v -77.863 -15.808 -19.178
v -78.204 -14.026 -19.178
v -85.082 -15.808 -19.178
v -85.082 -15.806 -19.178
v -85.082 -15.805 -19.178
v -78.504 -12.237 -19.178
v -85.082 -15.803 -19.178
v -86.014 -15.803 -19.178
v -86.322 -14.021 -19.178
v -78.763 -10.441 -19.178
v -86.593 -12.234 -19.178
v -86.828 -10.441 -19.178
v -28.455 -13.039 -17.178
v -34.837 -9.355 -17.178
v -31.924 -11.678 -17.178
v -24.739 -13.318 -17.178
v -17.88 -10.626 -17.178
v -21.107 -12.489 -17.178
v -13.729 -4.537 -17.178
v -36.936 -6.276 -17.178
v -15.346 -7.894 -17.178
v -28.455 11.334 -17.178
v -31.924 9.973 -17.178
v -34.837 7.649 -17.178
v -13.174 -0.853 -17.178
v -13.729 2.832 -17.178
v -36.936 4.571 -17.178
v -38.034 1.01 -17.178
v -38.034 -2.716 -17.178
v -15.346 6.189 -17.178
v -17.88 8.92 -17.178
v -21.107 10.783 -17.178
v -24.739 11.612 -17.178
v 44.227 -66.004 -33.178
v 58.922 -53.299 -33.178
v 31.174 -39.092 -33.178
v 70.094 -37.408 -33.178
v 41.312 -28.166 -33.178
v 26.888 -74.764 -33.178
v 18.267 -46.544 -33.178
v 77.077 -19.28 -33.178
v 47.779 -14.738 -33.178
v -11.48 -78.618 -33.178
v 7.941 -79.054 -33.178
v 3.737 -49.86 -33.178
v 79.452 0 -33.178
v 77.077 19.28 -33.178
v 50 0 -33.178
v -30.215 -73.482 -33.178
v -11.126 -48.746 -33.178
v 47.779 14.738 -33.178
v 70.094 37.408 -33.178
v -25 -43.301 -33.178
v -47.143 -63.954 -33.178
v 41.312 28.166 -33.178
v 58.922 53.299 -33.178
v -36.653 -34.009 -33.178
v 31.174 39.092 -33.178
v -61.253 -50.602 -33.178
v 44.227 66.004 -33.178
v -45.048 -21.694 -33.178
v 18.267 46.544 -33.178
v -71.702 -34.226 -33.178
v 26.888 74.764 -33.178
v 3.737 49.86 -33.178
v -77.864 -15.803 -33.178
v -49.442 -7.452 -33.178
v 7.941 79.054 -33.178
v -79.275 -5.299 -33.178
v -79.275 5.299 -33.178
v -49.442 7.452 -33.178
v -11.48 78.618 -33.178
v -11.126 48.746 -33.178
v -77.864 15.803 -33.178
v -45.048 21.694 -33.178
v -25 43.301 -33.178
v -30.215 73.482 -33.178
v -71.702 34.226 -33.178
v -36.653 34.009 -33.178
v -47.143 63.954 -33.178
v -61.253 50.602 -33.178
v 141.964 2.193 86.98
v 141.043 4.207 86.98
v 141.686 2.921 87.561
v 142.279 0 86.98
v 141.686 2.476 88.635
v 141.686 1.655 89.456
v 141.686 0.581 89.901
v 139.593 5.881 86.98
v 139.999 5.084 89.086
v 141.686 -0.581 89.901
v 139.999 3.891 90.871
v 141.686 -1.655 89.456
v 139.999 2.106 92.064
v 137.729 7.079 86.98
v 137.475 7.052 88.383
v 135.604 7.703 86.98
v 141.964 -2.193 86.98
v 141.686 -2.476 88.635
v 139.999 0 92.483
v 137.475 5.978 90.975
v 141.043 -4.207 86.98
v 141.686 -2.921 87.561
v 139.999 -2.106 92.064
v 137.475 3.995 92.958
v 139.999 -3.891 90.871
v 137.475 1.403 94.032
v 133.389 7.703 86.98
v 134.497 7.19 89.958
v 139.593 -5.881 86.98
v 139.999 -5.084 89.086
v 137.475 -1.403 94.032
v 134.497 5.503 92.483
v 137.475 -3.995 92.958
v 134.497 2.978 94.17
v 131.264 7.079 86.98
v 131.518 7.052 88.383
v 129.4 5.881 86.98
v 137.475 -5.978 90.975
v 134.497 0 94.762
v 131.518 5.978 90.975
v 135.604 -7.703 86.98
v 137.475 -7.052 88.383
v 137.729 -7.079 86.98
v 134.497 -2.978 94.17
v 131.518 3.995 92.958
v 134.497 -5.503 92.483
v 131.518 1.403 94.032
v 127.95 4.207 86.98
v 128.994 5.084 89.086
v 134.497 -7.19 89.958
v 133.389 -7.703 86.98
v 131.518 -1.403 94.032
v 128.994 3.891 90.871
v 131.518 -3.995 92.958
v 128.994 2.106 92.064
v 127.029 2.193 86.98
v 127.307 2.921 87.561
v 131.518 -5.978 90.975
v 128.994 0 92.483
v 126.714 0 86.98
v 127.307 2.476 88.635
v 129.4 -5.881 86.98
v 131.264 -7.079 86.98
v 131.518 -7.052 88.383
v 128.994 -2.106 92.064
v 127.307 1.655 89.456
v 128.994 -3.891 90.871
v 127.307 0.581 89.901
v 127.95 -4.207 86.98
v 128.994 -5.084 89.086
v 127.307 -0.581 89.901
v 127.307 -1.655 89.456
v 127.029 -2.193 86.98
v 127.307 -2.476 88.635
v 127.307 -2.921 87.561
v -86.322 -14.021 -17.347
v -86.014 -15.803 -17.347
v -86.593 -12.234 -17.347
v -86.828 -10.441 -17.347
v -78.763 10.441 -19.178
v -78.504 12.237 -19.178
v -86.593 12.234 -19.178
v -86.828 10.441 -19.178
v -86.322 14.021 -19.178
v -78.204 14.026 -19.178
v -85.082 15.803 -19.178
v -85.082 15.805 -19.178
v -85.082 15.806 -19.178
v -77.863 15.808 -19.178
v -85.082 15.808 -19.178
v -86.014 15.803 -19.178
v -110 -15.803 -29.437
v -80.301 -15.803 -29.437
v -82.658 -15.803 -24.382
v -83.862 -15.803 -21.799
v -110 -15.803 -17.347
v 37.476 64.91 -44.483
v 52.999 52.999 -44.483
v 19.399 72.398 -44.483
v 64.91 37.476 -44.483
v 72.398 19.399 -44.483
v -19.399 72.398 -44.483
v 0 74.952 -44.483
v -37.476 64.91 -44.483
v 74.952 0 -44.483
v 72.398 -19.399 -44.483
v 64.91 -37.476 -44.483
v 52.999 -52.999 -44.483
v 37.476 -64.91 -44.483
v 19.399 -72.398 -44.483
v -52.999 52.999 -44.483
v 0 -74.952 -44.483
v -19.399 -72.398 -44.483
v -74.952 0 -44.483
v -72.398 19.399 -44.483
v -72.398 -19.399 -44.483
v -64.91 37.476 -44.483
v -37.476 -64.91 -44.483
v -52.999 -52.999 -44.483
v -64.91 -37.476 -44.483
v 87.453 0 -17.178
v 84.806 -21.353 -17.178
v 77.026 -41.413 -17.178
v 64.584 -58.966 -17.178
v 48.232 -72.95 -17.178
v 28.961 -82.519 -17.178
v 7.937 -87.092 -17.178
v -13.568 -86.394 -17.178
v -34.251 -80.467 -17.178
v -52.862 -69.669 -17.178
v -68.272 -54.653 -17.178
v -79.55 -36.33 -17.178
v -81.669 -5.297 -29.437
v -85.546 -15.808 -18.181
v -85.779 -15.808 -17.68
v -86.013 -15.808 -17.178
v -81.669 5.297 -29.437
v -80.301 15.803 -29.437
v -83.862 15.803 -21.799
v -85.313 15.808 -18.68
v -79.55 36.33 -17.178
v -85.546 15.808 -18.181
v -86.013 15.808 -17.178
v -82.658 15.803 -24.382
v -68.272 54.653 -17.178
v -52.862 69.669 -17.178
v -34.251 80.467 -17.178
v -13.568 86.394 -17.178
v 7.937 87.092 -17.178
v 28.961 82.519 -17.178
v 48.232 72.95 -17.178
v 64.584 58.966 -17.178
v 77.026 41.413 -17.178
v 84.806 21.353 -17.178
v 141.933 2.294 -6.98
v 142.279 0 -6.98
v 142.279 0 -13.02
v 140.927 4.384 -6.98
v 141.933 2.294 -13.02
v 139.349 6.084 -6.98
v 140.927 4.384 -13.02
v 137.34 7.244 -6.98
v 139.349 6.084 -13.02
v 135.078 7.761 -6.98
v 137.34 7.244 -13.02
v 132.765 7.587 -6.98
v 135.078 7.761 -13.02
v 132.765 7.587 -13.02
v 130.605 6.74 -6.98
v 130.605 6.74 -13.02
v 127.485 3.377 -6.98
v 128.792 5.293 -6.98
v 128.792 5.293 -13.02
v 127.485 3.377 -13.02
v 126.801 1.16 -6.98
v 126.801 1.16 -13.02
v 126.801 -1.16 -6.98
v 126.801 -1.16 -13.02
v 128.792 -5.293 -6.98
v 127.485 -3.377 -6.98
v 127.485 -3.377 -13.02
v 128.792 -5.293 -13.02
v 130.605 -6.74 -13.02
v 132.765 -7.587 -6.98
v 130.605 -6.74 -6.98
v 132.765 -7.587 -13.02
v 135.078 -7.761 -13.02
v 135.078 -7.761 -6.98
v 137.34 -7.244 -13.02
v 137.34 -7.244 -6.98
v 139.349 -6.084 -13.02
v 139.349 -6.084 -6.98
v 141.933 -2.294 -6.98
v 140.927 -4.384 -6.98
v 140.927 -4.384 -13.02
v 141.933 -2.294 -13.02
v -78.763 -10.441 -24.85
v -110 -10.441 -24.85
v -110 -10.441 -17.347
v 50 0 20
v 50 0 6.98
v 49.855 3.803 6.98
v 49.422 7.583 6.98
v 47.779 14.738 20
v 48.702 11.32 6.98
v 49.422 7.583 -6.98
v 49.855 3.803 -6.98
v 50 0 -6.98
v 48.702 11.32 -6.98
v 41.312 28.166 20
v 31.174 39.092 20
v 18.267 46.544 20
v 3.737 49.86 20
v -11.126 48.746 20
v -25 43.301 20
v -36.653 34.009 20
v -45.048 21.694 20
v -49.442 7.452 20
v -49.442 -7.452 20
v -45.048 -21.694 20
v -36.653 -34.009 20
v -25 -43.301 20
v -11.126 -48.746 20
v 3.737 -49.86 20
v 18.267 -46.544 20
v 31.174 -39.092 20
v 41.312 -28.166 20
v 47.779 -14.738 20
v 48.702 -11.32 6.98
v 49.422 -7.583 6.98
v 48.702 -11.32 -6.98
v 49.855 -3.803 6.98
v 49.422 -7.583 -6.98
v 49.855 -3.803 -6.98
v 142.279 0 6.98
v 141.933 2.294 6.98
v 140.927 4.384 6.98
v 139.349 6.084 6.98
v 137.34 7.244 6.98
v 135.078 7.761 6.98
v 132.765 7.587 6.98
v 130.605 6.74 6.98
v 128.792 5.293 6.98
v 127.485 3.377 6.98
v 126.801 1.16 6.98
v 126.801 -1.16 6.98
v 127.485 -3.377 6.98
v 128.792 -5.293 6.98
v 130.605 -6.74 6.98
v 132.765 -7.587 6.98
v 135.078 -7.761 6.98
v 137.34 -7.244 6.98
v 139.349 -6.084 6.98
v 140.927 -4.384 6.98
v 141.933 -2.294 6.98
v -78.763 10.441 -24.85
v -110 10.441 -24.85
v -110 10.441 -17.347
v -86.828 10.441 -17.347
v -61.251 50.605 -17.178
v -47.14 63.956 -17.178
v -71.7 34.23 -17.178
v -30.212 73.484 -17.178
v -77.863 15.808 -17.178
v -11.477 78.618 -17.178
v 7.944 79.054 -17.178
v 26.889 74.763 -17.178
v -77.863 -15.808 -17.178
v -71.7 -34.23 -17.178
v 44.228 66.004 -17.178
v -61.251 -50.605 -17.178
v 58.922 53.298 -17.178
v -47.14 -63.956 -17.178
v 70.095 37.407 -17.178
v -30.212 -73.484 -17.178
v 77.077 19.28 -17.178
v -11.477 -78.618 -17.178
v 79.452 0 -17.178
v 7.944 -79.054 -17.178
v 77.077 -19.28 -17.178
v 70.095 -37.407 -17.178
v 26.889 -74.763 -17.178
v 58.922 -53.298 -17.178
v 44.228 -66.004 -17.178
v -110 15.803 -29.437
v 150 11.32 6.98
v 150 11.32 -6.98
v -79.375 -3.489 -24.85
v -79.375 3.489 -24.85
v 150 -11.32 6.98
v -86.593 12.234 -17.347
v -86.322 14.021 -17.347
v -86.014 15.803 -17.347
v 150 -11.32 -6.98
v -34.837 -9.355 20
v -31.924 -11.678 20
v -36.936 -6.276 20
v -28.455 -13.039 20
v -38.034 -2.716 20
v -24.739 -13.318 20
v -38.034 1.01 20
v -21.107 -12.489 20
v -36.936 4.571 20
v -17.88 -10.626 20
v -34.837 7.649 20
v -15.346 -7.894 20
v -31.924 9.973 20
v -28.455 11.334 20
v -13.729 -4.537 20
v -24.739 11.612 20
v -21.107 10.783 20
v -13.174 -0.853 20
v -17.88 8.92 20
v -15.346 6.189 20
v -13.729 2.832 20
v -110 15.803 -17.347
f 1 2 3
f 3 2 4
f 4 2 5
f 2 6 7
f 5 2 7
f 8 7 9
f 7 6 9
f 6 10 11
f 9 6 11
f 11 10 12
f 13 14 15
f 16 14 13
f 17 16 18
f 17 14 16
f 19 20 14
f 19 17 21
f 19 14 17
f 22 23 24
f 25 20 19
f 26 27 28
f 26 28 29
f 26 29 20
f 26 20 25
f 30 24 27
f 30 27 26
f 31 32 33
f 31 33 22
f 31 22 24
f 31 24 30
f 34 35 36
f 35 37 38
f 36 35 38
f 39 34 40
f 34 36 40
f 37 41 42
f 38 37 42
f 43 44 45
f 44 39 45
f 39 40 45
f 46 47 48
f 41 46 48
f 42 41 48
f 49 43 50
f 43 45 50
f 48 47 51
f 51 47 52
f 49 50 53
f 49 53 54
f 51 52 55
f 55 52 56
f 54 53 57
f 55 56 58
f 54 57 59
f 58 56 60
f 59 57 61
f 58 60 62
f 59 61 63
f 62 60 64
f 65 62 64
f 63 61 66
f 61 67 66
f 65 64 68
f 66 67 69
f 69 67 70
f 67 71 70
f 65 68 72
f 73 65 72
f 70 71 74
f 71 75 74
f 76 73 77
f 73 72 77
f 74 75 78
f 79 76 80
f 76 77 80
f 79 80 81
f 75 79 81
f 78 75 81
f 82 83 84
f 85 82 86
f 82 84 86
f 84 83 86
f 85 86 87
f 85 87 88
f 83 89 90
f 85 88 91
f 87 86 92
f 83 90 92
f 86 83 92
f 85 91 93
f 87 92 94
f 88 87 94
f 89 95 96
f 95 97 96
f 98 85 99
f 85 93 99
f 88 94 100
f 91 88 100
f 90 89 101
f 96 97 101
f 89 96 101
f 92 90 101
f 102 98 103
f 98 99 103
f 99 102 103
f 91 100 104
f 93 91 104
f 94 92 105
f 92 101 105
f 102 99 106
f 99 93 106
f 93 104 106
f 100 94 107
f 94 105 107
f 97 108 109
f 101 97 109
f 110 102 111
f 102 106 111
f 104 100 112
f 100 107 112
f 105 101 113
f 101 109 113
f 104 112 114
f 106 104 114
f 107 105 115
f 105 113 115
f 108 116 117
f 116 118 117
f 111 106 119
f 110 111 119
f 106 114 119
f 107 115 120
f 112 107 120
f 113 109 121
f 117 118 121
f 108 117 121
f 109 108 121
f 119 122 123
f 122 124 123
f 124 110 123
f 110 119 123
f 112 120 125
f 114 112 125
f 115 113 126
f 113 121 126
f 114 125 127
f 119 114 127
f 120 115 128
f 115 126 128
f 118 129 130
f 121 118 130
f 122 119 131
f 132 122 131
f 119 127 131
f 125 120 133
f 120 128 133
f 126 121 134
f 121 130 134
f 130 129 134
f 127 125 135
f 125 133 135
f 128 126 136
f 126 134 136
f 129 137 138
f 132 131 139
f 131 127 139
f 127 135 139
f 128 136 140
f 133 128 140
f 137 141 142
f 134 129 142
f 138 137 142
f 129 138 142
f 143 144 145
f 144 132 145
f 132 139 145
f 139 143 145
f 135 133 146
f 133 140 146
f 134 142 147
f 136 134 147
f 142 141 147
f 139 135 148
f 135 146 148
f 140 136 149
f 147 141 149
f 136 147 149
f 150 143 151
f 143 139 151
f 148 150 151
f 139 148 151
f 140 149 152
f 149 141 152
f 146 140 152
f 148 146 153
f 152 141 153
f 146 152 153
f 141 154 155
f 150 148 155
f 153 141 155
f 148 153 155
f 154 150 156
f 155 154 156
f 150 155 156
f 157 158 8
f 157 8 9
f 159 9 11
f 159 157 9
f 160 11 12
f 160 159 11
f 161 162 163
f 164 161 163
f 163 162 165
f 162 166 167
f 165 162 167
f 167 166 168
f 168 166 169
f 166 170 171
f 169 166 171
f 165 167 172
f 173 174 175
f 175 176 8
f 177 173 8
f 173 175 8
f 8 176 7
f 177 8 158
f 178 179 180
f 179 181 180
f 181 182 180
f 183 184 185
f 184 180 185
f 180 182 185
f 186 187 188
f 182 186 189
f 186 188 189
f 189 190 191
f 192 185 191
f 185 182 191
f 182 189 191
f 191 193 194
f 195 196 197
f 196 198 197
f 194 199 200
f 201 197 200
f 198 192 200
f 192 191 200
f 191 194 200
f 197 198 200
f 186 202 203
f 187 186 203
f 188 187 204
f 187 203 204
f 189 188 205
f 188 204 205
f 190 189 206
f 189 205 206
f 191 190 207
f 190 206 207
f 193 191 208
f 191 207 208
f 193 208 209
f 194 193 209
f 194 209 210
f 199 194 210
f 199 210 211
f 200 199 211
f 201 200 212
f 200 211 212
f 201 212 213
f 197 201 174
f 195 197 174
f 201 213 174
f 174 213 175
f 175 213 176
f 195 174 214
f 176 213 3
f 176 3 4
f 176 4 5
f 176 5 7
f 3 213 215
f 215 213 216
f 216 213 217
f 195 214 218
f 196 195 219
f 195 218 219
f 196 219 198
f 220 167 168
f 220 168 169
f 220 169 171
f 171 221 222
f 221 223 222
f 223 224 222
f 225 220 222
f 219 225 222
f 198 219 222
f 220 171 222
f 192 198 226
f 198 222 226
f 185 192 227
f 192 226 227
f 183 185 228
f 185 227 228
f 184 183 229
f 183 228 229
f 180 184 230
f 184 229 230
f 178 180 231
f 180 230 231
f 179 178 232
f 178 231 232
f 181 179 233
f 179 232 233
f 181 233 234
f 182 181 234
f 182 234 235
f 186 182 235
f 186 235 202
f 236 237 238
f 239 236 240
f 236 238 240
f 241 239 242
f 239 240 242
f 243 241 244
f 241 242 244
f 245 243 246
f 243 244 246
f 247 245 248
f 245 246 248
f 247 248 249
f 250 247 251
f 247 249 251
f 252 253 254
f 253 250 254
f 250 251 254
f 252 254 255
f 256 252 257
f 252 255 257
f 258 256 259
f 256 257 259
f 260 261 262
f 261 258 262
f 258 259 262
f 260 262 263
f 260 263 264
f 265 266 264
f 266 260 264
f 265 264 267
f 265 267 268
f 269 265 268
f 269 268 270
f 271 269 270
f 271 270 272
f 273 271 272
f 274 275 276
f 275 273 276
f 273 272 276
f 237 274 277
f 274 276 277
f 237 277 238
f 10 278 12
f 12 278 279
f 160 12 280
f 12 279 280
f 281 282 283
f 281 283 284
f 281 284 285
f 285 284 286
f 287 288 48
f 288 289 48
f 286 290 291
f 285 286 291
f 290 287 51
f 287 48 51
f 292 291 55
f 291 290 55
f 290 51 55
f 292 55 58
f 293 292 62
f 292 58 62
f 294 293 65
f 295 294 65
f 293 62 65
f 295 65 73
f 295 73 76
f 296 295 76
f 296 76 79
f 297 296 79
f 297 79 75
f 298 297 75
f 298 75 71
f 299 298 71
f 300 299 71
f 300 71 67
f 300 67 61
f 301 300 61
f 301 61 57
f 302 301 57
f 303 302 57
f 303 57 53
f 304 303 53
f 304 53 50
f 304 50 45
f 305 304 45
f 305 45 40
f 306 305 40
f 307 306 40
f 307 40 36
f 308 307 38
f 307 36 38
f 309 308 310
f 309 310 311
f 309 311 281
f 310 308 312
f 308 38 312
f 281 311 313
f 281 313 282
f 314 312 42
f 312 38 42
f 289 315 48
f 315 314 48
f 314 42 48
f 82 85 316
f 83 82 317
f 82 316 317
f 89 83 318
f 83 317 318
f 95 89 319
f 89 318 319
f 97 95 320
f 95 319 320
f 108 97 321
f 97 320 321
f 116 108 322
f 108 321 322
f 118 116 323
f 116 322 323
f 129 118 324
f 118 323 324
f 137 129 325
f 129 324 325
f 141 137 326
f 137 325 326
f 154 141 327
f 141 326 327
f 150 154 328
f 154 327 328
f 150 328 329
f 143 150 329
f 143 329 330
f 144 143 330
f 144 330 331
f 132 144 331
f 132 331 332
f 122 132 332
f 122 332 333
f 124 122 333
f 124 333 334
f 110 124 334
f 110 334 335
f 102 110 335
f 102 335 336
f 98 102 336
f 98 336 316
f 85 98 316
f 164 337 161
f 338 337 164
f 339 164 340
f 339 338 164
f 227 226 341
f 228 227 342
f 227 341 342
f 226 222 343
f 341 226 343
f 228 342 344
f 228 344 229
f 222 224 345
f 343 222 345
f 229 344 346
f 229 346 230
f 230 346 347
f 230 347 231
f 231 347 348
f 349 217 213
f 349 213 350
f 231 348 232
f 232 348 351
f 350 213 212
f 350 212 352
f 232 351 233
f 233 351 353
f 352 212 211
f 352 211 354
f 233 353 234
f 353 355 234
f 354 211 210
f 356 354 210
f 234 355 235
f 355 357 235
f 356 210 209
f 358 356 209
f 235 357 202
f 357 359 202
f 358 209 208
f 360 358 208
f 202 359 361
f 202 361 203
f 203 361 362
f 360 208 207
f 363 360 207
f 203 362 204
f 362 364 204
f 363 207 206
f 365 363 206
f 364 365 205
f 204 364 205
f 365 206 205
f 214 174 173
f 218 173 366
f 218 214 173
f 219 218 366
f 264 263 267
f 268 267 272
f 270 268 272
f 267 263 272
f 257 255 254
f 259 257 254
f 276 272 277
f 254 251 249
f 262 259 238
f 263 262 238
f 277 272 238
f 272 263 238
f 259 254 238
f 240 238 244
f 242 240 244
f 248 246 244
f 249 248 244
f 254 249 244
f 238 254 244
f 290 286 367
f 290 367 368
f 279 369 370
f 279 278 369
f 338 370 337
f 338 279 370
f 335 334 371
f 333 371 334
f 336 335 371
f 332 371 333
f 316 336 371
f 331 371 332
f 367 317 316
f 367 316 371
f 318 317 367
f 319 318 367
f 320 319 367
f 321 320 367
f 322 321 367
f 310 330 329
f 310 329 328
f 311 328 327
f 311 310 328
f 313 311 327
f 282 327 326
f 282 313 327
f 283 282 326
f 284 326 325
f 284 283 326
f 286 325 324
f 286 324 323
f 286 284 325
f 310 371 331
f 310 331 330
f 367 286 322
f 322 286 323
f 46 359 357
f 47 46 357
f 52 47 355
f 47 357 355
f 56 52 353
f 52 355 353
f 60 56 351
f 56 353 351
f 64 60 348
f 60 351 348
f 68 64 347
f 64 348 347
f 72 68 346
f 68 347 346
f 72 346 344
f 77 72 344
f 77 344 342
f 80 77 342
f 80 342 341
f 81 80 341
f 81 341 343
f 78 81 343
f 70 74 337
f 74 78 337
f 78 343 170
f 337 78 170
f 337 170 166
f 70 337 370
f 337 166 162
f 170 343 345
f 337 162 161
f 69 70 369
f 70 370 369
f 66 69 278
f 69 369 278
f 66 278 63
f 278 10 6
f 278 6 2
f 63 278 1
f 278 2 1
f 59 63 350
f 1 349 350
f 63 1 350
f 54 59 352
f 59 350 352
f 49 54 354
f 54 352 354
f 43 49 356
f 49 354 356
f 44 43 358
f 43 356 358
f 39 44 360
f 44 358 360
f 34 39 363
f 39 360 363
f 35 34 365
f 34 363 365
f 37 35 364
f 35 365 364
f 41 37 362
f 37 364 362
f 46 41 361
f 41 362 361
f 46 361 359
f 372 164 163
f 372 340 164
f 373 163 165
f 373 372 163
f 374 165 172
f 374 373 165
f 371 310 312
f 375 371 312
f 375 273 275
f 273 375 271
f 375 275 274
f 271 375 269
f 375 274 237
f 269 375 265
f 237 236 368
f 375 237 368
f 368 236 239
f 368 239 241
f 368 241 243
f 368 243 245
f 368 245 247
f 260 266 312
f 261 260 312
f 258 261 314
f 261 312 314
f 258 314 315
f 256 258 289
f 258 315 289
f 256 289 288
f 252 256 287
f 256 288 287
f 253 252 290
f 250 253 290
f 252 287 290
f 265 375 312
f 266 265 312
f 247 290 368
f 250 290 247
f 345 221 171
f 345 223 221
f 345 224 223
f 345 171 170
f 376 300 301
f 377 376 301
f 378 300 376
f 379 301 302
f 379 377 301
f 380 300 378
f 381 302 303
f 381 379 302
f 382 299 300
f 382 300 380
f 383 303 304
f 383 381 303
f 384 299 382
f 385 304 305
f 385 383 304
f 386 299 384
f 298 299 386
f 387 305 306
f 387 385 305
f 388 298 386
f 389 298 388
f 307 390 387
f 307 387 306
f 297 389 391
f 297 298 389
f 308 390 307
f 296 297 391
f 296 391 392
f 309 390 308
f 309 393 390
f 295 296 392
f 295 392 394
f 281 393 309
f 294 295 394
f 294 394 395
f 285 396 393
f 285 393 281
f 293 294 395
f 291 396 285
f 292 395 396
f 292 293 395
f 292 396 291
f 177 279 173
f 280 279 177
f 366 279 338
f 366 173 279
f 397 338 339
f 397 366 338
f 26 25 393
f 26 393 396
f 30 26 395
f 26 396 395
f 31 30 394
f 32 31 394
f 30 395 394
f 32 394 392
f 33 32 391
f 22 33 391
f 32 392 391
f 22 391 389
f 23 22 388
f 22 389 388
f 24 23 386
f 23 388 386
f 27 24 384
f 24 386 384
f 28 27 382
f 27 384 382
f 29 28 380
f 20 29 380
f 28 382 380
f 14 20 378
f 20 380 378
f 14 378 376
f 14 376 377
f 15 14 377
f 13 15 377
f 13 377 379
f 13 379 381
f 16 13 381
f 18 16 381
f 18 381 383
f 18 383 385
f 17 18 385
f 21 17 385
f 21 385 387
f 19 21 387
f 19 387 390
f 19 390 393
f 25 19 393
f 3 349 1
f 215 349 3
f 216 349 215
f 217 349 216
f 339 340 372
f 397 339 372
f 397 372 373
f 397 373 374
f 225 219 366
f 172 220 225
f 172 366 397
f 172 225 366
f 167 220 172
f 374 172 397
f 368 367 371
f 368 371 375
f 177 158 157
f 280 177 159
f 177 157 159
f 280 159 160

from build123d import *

# Parameters (mm, degrees)
SKETCH_1_R               = 50
EXTRUDE_1_DEPTH          = 20
SKETCH_4_R               = 12.5
CUT_EXTRUDE_1_DEPTH      = 40
EXTRUDE_2_REACH          = 115.578
EXTRUDE_2_END_RADIUS     = 50
SKETCH_5_W               = 13.960137626
SKETCH_5_H               = 22.640061842
SKETCH_6_W               = 13.960137626
SKETCH_6_H               = 22.640061842
EXTRUDE_3_DEPTH          = 100
EXTRUDE_4_DEPTH          = 80
EXTRUDE_4_DEPTH_BACK     = 20
SKETCH_7_R               = 7.782320826
SKETCH_13_R              = 79.451687304
CUT_EXTRUDE_2_DEPTH      = 16
SKETCH_14_R              = 50
EXTRUDE_5_DEPTH          = 16
SKETCH_17_W              = 12.089731424
SKETCH_17_H              = 31.60601215
EXTRUDE_6_DEPTH          = 50
CUT_EXTRUDE_3_DEPTH      = 15.831035086
CUT_EXTRUDE_4_REACH      = 292.221
CUT_EXTRUDE_4_END_RADIUS = 79.451687304
SKETCH_25_W              = 7.503169627
SKETCH_25_H              = 20.882263368
CUT_EXTRUDE_5_DEPTH      = 2
SKETCH_27_W              = 13.960137626
SKETCH_27_H              = 22.640061842
EXTRUDE_7_DEPTH          = 40


with BuildPart() as part:
    # 草图1 → 凸台-拉伸1 (new, symmetric)
    with BuildSketch(Plane.XY):
        Circle(SKETCH_1_R)
    extrude(amount=EXTRUDE_1_DEPTH, both=True)

    # 草图4 → 切除-拉伸1 (cut)
    with BuildSketch(Plane.XY.offset(20)):
        with Locations((-25.673554091, -0.852792881)):
            Circle(SKETCH_4_R)
    extrude(amount=-CUT_EXTRUDE_1_DEPTH, mode=Mode.SUBTRACT)

    # 凸台-拉伸2: up to this cylinder (the profile starts outside it)
    extrude_2_end = Plane(origin=(0, 0, 0), z_dir=(0, 0, -1)) * Cylinder(EXTRUDE_2_END_RADIUS, 332.156, mode=Mode.PRIVATE)
    # 草图5 → 凸台-拉伸2 (add, up to the surface)
    with BuildSketch(Plane(origin=(50, 0, 0), x_dir=(0, 0, -1), z_dir=(1, 0, 0)), mode=Mode.PRIVATE) as extrude_2_sk1:
        Rectangle(SKETCH_5_W, SKETCH_5_H)
    extrude_2_tool1 = extrude(extrude_2_sk1.sketch, amount=-EXTRUDE_2_REACH, mode=Mode.PRIVATE) - extrude_2_end
    add(extrude_2_tool1.solids().sort_by_distance((50, 0, 0))[0])
    add(extrude_2_tool1.solids().sort_by_distance((50, 0, 0))[1])

    # 草图6 → 凸台-拉伸3 (add)
    with BuildSketch(Plane(origin=(50, 0, 0), x_dir=(0, 0, -1), z_dir=(1, 0, 0))):
        Rectangle(SKETCH_6_W, SKETCH_6_H)
    extrude(amount=EXTRUDE_3_DEPTH)

    # 草图7 → 凸台-拉伸4 (add, two sides: drawn at the far end of the back side and taken through both)
    with BuildSketch(Plane.XY.offset(6.980068813).offset(-EXTRUDE_4_DEPTH_BACK)):
        with Locations((134.496533675, 0)):
            Circle(SKETCH_7_R)
    extrude(amount=EXTRUDE_4_DEPTH + EXTRUDE_4_DEPTH_BACK)

    # 草图8 → 旋转1 (revolve)
    with BuildSketch(Plane.XY.offset(86.980068813)):
        with BuildLine():
            Line((126.714212849, 0), (142.278854501, 0))
            ThreePointArc((142.278854501, 0), (134.496533675, -7.782320826), (126.714212849, 0))
        make_face()
    revolve(axis=Axis((126.714212849, 0, 86.980068813), (1, 0, 0)))

    # 草图10 → 旋转2 (revolve)
    with BuildSketch(Plane(origin=(0, 0, 0), x_dir=(1, 0, 0), z_dir=(0, 1, 0))):
        Polygon((0, 20), (0, 44.4833931), (74.95212992, 44.4833931), (87.453253564, 17.178307248), (50, 17.178307248), (50, 20), align=None)
    revolve(axis=Axis((0, 0, -20), (0, 0, -1)))

    # 草图13 → 切除-拉伸2 (cut)
    with BuildSketch(Plane.XY.offset(-17.178307248)):
        Circle(SKETCH_13_R)
    extrude(amount=-CUT_EXTRUDE_2_DEPTH, mode=Mode.SUBTRACT)


with BuildPart() as cut_extrude_2_piece_1:
    # of the separate pieces the step leaves, piece 1, a body of its own (cut_extrude_2_pieces)
    add(part.part.solids().sort_by_distance((50, 0, -17.178307248))[0])



with BuildPart() as cut_extrude_2_piece_2:
    # of the separate pieces the step leaves, piece 2, a body of its own (cut_extrude_2_pieces)
    add(part.part.solids().sort_by_distance((87.453253564, 0, -17.178307248))[0])


with BuildPart() as cut_extrude_2_piece_1_1:
    add(cut_extrude_2_piece_1.part)

    add(cut_extrude_2_piece_2.part)  # 凸台-拉伸5 merges 切除-拉伸2 piece 2
    # 草图14 → 凸台-拉伸5 (add)
    with BuildSketch(Plane.XY.offset(-33.178307248)):
        Circle(SKETCH_14_R)
    extrude(amount=EXTRUDE_5_DEPTH)

    # 草图17 → 凸台-拉伸6 (add)
    with BuildSketch(Plane.ZY.offset(60)):
        with Locations((-23.392137874, 0)):
            Rectangle(SKETCH_17_W, SKETCH_17_H)
    extrude(amount=EXTRUDE_6_DEPTH)

    # 草图18 → 切除-拉伸3 (cut)
    with BuildSketch(Plane.XY.offset(-17.347272162)):
        with BuildLine():
            Line((-77.864212669, 15.803006075), (-60, 15.803006075))
            Line((-60, 15.803006075), (-60, -15.803006075))
            Line((-60, -15.803006075), (-77.864212669, -15.803006075))
            ThreePointArc((-77.864212669, -15.803006075), (-79.451687304, 0), (-77.864212669, 15.803006075))
        make_face()
    extrude(amount=-CUT_EXTRUDE_3_DEPTH, mode=Mode.SUBTRACT)

    # 切除-拉伸4: up to this cylinder (the profile starts outside it)
    cut_extrude_4_end = Plane(origin=(0, 0, -21.098857), z_dir=(0, 0, 1)) * Cylinder(CUT_EXTRUDE_4_END_RADIUS, 744.345374609, mode=Mode.PRIVATE)
    # 草图25 → 切除-拉伸4 (cut, up to the surface)
    with BuildSketch(Plane.ZY.offset(110), mode=Mode.PRIVATE) as cut_extrude_4_sk1:
        with Locations((-21.098856975, 0)):
            Rectangle(SKETCH_25_W, SKETCH_25_H)
    cut_extrude_4_tool1 = extrude(cut_extrude_4_sk1.sketch, amount=-CUT_EXTRUDE_4_REACH, mode=Mode.PRIVATE) - cut_extrude_4_end
    add(cut_extrude_4_tool1.solids().sort_by_distance((-110, 0, -21.098857))[0], mode=Mode.SUBTRACT)

    # 草图26 → 切除-拉伸5 (cut)
    with BuildSketch(Plane.XY.offset(-17.178307248)):
        with BuildLine():
            Line((-86.012727773, 15.807663329), (-77.863267306, 15.807663329))
            ThreePointArc((-77.863267306, 15.807663329), (-79.451687304, 0), (-77.863267306, -15.807663329))
            Line((-77.863267306, -15.807663329), (-86.012727773, -15.807663329))
            ThreePointArc((-86.012727773, -15.807663329), (-87.453253564, 0), (-86.012727773, 15.807663329))
        make_face()
    extrude(amount=-CUT_EXTRUDE_5_DEPTH, mode=Mode.SUBTRACT)

    # 草图27 → 凸台-拉伸7 (add)
    with BuildSketch(Plane(origin=(50, 0, 0), x_dir=(0, 0, -1), z_dir=(1, 0, 0))):
        Rectangle(SKETCH_27_W, SKETCH_27_H)
    extrude(amount=-EXTRUDE_7_DEPTH)


solid = cut_extrude_2_piece_1_1.part
